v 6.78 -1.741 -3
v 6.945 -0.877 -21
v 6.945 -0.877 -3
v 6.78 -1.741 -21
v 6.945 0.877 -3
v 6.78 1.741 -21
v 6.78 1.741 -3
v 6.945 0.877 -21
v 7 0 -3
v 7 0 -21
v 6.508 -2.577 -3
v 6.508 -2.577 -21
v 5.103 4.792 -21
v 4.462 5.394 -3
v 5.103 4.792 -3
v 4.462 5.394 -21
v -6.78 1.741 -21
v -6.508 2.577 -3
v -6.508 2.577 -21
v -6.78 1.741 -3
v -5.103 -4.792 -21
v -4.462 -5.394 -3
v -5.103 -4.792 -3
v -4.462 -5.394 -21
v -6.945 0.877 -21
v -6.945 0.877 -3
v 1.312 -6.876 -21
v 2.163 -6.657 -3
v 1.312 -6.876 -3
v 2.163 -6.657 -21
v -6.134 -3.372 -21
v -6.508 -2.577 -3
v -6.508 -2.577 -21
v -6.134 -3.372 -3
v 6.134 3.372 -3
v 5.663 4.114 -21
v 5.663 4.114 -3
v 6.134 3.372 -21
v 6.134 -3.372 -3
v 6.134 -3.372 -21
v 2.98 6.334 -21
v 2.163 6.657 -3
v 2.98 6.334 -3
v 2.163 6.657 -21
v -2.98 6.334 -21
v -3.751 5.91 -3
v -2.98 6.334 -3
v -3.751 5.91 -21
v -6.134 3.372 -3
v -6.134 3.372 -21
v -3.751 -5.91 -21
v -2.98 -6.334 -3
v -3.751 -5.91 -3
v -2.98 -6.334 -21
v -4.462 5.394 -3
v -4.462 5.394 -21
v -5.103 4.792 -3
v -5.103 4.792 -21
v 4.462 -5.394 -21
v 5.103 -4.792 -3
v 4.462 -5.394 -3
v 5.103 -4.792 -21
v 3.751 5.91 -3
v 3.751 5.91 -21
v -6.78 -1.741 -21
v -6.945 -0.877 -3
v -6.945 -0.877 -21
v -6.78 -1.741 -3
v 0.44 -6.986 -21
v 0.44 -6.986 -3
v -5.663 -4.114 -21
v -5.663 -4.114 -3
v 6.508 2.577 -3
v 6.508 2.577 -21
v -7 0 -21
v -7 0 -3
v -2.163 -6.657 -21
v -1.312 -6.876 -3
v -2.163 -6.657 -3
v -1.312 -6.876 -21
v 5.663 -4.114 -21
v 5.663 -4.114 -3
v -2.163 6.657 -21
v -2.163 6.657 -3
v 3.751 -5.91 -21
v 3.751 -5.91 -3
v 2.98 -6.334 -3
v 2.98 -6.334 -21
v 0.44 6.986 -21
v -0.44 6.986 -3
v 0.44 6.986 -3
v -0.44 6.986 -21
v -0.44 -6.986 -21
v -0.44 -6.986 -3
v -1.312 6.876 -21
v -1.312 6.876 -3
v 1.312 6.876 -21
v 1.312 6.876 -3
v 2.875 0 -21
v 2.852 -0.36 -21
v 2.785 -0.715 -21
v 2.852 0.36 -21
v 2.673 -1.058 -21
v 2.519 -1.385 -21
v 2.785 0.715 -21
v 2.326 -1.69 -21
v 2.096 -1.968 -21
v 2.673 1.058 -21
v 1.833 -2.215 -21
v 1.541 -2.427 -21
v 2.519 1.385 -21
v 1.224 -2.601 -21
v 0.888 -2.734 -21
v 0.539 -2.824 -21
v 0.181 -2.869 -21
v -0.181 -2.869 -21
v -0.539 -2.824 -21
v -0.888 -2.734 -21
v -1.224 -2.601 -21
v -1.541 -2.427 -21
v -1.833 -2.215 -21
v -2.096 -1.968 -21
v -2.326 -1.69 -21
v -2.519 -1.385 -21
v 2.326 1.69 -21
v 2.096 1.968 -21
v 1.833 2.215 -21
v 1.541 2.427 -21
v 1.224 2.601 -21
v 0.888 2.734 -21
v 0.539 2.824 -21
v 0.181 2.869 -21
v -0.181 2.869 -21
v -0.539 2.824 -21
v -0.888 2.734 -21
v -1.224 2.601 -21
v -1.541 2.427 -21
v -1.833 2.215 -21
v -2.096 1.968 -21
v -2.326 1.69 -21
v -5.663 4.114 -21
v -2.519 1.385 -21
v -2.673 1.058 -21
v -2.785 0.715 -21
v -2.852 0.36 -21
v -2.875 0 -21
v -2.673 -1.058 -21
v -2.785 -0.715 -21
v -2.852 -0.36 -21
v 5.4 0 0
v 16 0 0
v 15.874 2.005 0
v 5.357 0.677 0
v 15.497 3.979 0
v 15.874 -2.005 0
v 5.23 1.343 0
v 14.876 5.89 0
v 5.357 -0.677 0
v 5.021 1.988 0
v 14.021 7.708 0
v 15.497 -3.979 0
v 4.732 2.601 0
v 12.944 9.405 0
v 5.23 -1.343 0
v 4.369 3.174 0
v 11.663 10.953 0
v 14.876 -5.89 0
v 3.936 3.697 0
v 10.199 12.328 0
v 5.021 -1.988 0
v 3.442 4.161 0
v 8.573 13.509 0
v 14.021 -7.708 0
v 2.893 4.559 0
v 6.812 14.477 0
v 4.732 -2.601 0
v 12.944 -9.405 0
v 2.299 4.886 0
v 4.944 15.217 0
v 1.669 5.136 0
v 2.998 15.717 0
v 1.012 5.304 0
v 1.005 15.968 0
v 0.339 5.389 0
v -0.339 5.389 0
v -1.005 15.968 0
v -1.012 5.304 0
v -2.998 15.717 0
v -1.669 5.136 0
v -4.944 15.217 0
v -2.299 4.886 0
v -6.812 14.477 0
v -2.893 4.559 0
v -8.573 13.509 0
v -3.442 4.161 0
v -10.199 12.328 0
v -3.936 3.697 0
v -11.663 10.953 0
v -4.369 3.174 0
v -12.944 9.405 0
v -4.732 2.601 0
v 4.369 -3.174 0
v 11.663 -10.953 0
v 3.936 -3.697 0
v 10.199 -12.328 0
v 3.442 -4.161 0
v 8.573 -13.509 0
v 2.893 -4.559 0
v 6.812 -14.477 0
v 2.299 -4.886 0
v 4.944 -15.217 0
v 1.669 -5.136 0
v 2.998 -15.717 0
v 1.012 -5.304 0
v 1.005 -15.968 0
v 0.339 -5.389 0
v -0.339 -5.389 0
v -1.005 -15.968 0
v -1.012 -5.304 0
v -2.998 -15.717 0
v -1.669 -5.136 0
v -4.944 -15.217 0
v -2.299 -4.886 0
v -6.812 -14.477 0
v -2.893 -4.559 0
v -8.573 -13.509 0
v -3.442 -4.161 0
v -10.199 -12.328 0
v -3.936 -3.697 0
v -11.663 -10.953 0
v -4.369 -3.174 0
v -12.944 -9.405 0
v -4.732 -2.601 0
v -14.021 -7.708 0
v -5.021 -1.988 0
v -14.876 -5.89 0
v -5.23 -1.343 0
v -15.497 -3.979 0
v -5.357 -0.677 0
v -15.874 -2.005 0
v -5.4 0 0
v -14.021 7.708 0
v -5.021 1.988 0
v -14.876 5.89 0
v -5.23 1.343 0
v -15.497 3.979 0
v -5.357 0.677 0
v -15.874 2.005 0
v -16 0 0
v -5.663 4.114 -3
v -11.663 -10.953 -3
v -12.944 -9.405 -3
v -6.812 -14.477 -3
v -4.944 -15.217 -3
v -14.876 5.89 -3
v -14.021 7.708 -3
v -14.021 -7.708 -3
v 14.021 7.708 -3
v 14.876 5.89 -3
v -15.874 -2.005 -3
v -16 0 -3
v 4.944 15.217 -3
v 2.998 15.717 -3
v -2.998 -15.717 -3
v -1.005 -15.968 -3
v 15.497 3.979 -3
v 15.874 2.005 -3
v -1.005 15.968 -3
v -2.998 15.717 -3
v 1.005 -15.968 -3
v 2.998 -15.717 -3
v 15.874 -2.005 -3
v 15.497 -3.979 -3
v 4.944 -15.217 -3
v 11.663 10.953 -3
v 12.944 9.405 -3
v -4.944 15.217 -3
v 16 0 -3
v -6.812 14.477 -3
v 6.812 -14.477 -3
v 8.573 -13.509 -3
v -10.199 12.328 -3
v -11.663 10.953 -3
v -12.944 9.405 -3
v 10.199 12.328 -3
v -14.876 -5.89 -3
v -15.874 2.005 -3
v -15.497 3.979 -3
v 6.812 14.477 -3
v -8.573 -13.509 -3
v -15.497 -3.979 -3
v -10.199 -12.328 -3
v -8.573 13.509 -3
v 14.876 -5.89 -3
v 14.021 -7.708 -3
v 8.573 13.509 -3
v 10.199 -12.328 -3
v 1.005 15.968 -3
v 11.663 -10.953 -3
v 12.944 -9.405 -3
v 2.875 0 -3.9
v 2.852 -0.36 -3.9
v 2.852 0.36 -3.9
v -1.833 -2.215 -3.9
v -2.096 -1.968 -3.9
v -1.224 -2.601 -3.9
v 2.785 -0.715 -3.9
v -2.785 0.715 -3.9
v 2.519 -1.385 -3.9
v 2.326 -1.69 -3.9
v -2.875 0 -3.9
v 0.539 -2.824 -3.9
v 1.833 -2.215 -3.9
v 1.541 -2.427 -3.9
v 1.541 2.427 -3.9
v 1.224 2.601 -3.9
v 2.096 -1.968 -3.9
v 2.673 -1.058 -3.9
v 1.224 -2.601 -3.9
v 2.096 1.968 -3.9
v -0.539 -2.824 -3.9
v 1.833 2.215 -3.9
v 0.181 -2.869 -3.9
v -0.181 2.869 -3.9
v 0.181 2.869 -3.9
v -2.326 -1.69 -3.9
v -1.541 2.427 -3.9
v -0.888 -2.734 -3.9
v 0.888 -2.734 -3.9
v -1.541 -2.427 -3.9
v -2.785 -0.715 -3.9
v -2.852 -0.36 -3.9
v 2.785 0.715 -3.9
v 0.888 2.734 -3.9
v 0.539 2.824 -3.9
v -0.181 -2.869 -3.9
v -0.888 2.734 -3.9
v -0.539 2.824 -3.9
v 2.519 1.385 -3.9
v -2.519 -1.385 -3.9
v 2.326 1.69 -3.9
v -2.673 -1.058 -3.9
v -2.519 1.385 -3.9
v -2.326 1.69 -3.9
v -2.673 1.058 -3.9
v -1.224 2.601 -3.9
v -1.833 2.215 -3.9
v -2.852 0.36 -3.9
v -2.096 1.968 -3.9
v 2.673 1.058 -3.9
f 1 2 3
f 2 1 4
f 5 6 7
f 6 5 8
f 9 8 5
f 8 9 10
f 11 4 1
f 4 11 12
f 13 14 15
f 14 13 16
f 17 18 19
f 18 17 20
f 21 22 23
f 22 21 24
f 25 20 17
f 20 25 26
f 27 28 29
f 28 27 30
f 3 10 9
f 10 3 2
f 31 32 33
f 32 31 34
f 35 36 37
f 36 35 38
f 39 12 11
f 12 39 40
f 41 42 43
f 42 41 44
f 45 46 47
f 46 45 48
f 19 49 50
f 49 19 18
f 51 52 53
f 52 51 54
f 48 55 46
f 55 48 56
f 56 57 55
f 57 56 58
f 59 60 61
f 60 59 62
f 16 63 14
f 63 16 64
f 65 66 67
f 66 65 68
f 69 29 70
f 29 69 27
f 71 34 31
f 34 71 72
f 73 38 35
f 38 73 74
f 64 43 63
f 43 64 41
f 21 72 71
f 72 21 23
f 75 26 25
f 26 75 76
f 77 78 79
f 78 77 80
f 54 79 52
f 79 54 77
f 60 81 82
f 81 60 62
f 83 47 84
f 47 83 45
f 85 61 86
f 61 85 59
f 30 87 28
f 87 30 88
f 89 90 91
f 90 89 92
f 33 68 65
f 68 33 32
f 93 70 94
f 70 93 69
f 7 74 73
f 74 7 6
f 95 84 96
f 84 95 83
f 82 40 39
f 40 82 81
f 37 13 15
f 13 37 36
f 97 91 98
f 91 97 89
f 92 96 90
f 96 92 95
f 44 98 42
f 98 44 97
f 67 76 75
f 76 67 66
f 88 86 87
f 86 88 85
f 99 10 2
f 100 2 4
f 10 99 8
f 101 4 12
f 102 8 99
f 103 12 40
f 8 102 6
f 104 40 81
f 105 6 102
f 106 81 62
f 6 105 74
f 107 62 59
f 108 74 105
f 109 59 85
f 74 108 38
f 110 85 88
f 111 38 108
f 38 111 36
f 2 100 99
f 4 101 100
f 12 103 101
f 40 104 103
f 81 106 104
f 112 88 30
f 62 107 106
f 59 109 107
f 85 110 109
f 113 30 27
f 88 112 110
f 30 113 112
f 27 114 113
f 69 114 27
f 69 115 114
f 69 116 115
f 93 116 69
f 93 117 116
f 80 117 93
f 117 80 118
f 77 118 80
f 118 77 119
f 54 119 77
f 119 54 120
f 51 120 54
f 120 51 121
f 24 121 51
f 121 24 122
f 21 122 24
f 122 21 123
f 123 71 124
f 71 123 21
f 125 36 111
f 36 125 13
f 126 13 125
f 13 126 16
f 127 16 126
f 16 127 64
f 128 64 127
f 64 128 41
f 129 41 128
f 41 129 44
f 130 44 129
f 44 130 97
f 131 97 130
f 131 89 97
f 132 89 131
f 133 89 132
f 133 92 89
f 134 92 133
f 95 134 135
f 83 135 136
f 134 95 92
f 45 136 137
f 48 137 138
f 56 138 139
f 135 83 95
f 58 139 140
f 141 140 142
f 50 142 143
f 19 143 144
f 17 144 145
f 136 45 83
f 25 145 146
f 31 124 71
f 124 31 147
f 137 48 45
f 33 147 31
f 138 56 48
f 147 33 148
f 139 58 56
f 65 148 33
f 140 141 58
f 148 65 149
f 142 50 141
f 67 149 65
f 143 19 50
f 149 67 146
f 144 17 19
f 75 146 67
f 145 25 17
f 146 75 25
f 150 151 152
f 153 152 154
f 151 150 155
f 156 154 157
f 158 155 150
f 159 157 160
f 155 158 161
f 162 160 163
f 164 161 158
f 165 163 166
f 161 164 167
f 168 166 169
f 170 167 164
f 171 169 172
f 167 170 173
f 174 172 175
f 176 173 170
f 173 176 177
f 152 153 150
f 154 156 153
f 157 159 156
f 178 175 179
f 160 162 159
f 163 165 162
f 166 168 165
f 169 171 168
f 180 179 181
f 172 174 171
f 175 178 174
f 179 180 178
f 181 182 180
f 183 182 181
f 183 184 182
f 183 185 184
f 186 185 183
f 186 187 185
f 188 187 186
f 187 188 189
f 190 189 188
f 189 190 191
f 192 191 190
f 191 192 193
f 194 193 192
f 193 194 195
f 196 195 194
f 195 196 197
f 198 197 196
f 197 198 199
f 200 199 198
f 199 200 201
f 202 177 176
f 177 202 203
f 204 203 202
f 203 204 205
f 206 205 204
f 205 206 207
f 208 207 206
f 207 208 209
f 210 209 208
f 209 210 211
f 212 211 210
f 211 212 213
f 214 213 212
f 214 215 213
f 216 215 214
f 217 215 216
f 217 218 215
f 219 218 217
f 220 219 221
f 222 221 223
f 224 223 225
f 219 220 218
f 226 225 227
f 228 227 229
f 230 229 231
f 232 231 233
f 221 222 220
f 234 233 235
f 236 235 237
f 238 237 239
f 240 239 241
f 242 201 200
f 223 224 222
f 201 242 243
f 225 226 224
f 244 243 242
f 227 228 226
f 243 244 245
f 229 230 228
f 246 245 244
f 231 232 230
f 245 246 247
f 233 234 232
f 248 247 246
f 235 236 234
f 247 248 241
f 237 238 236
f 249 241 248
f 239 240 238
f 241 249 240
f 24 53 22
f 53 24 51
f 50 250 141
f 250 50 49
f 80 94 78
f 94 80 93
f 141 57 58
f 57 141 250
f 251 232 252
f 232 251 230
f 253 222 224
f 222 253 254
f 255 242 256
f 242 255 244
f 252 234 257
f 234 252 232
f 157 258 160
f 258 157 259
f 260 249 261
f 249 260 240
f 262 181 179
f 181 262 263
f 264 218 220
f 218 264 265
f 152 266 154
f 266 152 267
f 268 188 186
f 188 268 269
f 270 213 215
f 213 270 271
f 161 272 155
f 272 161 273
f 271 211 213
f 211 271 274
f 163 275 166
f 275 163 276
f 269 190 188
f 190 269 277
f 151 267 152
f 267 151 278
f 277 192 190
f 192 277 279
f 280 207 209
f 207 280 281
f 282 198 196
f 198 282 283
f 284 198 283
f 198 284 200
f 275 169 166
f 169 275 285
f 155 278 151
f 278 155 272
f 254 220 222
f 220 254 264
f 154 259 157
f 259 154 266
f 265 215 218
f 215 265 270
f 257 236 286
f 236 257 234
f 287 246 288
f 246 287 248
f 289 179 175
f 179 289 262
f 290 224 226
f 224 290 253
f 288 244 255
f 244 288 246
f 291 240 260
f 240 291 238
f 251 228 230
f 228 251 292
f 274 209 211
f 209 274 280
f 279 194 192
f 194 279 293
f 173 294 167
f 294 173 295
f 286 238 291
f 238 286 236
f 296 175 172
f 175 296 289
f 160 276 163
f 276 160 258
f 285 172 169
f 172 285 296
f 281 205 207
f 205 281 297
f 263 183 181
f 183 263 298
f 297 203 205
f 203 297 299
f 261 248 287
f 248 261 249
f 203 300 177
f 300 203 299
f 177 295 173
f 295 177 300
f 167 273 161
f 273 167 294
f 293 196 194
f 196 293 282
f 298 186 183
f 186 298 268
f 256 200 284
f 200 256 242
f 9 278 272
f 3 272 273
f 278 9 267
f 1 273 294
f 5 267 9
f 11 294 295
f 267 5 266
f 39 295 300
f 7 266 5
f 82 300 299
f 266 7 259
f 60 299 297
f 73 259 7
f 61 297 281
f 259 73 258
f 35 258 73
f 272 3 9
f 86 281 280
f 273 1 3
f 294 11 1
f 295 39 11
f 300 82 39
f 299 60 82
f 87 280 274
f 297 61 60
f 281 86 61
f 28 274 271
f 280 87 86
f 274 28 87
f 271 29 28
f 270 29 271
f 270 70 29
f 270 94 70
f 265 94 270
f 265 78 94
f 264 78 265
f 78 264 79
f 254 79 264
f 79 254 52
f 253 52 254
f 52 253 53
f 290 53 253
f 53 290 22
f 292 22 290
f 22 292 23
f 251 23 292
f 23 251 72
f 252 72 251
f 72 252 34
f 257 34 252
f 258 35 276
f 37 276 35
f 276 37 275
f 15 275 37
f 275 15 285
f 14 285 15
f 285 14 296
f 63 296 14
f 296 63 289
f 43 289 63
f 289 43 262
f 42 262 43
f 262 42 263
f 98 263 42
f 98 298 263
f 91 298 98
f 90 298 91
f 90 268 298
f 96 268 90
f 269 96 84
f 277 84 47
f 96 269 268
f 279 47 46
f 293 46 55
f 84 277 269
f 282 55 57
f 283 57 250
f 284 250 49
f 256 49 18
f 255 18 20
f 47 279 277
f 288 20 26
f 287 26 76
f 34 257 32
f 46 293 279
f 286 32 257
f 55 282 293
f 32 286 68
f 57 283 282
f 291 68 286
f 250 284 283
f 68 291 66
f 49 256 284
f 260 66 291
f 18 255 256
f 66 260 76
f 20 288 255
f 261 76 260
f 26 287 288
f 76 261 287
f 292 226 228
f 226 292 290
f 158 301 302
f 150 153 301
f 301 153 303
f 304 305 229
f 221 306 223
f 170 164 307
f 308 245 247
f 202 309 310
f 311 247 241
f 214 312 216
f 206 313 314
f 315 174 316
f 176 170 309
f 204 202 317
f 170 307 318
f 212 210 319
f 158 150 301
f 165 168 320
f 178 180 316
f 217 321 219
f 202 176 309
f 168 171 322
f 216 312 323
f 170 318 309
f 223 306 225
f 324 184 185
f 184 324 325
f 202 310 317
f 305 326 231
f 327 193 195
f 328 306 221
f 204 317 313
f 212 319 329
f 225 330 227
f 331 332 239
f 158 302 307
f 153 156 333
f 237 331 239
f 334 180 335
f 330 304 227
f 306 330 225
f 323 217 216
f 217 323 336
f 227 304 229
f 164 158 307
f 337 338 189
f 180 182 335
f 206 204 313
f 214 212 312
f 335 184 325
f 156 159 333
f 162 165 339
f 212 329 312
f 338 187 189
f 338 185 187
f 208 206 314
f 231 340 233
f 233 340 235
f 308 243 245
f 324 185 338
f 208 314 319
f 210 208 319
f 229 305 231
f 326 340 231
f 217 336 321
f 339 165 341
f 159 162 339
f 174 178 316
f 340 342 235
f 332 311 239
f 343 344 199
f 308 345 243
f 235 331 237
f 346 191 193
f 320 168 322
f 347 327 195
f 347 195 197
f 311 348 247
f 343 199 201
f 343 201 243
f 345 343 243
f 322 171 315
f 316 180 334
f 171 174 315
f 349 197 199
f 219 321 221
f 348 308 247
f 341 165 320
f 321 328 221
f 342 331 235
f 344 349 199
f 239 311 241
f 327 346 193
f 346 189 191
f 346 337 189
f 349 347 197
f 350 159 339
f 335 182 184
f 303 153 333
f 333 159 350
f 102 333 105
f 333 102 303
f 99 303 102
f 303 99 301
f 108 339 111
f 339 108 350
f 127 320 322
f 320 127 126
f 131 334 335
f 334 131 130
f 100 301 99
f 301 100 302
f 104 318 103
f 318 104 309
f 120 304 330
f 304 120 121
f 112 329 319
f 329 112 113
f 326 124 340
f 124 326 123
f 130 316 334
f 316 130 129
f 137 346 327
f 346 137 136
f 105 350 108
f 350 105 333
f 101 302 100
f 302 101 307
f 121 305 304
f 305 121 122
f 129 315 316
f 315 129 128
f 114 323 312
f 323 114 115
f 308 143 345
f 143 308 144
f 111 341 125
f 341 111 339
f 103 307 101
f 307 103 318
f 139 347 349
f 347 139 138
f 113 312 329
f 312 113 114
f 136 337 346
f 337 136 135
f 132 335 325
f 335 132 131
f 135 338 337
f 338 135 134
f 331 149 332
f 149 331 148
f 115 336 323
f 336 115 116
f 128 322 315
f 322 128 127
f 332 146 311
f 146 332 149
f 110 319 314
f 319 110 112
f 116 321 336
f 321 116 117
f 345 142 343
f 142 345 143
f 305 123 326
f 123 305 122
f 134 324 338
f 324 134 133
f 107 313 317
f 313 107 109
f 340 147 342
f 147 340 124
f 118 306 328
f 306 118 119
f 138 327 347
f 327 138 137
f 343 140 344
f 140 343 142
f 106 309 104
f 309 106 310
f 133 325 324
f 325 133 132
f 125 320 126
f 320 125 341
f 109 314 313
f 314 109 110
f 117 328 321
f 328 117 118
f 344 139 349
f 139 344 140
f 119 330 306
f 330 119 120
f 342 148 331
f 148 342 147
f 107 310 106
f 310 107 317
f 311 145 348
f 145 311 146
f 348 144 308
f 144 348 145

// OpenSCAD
$fn = 50;


difference() {
	union() {
		translate(v = [0, 0, -21.0000000000]) {
			cylinder(h = 21, r = 7.0000000000);
		}
		translate(v = [0, 0, -3.0000000000]) {
			cylinder(h = 3, r = 16.0000000000);
		}
	}
	union() {
		translate(v = [0, 0, 0]) {
			rotate(a = [0, 0, 0]) {
				difference() {
					union() {
						#translate(v = [0, 0, -21.0000000000]) {
							cylinder(h = 21, r = 2.6000000000);
						}
						#translate(v = [0, 0, -3.9000000000]) {
							cylinder(h = 3.9000000000, r1 = 2.8750000000, r2 = 5.4000000000);
						}
						#translate(v = [0, 0, -21.0000000000]) {
							cylinder(h = 21, r = 2.8750000000);
						}
						#translate(v = [0, 0, -21.0000000000]) {
							cylinder(h = 21, r = 2.6000000000);
						}
					}
					union();
				}
			}
		}
	}
}
